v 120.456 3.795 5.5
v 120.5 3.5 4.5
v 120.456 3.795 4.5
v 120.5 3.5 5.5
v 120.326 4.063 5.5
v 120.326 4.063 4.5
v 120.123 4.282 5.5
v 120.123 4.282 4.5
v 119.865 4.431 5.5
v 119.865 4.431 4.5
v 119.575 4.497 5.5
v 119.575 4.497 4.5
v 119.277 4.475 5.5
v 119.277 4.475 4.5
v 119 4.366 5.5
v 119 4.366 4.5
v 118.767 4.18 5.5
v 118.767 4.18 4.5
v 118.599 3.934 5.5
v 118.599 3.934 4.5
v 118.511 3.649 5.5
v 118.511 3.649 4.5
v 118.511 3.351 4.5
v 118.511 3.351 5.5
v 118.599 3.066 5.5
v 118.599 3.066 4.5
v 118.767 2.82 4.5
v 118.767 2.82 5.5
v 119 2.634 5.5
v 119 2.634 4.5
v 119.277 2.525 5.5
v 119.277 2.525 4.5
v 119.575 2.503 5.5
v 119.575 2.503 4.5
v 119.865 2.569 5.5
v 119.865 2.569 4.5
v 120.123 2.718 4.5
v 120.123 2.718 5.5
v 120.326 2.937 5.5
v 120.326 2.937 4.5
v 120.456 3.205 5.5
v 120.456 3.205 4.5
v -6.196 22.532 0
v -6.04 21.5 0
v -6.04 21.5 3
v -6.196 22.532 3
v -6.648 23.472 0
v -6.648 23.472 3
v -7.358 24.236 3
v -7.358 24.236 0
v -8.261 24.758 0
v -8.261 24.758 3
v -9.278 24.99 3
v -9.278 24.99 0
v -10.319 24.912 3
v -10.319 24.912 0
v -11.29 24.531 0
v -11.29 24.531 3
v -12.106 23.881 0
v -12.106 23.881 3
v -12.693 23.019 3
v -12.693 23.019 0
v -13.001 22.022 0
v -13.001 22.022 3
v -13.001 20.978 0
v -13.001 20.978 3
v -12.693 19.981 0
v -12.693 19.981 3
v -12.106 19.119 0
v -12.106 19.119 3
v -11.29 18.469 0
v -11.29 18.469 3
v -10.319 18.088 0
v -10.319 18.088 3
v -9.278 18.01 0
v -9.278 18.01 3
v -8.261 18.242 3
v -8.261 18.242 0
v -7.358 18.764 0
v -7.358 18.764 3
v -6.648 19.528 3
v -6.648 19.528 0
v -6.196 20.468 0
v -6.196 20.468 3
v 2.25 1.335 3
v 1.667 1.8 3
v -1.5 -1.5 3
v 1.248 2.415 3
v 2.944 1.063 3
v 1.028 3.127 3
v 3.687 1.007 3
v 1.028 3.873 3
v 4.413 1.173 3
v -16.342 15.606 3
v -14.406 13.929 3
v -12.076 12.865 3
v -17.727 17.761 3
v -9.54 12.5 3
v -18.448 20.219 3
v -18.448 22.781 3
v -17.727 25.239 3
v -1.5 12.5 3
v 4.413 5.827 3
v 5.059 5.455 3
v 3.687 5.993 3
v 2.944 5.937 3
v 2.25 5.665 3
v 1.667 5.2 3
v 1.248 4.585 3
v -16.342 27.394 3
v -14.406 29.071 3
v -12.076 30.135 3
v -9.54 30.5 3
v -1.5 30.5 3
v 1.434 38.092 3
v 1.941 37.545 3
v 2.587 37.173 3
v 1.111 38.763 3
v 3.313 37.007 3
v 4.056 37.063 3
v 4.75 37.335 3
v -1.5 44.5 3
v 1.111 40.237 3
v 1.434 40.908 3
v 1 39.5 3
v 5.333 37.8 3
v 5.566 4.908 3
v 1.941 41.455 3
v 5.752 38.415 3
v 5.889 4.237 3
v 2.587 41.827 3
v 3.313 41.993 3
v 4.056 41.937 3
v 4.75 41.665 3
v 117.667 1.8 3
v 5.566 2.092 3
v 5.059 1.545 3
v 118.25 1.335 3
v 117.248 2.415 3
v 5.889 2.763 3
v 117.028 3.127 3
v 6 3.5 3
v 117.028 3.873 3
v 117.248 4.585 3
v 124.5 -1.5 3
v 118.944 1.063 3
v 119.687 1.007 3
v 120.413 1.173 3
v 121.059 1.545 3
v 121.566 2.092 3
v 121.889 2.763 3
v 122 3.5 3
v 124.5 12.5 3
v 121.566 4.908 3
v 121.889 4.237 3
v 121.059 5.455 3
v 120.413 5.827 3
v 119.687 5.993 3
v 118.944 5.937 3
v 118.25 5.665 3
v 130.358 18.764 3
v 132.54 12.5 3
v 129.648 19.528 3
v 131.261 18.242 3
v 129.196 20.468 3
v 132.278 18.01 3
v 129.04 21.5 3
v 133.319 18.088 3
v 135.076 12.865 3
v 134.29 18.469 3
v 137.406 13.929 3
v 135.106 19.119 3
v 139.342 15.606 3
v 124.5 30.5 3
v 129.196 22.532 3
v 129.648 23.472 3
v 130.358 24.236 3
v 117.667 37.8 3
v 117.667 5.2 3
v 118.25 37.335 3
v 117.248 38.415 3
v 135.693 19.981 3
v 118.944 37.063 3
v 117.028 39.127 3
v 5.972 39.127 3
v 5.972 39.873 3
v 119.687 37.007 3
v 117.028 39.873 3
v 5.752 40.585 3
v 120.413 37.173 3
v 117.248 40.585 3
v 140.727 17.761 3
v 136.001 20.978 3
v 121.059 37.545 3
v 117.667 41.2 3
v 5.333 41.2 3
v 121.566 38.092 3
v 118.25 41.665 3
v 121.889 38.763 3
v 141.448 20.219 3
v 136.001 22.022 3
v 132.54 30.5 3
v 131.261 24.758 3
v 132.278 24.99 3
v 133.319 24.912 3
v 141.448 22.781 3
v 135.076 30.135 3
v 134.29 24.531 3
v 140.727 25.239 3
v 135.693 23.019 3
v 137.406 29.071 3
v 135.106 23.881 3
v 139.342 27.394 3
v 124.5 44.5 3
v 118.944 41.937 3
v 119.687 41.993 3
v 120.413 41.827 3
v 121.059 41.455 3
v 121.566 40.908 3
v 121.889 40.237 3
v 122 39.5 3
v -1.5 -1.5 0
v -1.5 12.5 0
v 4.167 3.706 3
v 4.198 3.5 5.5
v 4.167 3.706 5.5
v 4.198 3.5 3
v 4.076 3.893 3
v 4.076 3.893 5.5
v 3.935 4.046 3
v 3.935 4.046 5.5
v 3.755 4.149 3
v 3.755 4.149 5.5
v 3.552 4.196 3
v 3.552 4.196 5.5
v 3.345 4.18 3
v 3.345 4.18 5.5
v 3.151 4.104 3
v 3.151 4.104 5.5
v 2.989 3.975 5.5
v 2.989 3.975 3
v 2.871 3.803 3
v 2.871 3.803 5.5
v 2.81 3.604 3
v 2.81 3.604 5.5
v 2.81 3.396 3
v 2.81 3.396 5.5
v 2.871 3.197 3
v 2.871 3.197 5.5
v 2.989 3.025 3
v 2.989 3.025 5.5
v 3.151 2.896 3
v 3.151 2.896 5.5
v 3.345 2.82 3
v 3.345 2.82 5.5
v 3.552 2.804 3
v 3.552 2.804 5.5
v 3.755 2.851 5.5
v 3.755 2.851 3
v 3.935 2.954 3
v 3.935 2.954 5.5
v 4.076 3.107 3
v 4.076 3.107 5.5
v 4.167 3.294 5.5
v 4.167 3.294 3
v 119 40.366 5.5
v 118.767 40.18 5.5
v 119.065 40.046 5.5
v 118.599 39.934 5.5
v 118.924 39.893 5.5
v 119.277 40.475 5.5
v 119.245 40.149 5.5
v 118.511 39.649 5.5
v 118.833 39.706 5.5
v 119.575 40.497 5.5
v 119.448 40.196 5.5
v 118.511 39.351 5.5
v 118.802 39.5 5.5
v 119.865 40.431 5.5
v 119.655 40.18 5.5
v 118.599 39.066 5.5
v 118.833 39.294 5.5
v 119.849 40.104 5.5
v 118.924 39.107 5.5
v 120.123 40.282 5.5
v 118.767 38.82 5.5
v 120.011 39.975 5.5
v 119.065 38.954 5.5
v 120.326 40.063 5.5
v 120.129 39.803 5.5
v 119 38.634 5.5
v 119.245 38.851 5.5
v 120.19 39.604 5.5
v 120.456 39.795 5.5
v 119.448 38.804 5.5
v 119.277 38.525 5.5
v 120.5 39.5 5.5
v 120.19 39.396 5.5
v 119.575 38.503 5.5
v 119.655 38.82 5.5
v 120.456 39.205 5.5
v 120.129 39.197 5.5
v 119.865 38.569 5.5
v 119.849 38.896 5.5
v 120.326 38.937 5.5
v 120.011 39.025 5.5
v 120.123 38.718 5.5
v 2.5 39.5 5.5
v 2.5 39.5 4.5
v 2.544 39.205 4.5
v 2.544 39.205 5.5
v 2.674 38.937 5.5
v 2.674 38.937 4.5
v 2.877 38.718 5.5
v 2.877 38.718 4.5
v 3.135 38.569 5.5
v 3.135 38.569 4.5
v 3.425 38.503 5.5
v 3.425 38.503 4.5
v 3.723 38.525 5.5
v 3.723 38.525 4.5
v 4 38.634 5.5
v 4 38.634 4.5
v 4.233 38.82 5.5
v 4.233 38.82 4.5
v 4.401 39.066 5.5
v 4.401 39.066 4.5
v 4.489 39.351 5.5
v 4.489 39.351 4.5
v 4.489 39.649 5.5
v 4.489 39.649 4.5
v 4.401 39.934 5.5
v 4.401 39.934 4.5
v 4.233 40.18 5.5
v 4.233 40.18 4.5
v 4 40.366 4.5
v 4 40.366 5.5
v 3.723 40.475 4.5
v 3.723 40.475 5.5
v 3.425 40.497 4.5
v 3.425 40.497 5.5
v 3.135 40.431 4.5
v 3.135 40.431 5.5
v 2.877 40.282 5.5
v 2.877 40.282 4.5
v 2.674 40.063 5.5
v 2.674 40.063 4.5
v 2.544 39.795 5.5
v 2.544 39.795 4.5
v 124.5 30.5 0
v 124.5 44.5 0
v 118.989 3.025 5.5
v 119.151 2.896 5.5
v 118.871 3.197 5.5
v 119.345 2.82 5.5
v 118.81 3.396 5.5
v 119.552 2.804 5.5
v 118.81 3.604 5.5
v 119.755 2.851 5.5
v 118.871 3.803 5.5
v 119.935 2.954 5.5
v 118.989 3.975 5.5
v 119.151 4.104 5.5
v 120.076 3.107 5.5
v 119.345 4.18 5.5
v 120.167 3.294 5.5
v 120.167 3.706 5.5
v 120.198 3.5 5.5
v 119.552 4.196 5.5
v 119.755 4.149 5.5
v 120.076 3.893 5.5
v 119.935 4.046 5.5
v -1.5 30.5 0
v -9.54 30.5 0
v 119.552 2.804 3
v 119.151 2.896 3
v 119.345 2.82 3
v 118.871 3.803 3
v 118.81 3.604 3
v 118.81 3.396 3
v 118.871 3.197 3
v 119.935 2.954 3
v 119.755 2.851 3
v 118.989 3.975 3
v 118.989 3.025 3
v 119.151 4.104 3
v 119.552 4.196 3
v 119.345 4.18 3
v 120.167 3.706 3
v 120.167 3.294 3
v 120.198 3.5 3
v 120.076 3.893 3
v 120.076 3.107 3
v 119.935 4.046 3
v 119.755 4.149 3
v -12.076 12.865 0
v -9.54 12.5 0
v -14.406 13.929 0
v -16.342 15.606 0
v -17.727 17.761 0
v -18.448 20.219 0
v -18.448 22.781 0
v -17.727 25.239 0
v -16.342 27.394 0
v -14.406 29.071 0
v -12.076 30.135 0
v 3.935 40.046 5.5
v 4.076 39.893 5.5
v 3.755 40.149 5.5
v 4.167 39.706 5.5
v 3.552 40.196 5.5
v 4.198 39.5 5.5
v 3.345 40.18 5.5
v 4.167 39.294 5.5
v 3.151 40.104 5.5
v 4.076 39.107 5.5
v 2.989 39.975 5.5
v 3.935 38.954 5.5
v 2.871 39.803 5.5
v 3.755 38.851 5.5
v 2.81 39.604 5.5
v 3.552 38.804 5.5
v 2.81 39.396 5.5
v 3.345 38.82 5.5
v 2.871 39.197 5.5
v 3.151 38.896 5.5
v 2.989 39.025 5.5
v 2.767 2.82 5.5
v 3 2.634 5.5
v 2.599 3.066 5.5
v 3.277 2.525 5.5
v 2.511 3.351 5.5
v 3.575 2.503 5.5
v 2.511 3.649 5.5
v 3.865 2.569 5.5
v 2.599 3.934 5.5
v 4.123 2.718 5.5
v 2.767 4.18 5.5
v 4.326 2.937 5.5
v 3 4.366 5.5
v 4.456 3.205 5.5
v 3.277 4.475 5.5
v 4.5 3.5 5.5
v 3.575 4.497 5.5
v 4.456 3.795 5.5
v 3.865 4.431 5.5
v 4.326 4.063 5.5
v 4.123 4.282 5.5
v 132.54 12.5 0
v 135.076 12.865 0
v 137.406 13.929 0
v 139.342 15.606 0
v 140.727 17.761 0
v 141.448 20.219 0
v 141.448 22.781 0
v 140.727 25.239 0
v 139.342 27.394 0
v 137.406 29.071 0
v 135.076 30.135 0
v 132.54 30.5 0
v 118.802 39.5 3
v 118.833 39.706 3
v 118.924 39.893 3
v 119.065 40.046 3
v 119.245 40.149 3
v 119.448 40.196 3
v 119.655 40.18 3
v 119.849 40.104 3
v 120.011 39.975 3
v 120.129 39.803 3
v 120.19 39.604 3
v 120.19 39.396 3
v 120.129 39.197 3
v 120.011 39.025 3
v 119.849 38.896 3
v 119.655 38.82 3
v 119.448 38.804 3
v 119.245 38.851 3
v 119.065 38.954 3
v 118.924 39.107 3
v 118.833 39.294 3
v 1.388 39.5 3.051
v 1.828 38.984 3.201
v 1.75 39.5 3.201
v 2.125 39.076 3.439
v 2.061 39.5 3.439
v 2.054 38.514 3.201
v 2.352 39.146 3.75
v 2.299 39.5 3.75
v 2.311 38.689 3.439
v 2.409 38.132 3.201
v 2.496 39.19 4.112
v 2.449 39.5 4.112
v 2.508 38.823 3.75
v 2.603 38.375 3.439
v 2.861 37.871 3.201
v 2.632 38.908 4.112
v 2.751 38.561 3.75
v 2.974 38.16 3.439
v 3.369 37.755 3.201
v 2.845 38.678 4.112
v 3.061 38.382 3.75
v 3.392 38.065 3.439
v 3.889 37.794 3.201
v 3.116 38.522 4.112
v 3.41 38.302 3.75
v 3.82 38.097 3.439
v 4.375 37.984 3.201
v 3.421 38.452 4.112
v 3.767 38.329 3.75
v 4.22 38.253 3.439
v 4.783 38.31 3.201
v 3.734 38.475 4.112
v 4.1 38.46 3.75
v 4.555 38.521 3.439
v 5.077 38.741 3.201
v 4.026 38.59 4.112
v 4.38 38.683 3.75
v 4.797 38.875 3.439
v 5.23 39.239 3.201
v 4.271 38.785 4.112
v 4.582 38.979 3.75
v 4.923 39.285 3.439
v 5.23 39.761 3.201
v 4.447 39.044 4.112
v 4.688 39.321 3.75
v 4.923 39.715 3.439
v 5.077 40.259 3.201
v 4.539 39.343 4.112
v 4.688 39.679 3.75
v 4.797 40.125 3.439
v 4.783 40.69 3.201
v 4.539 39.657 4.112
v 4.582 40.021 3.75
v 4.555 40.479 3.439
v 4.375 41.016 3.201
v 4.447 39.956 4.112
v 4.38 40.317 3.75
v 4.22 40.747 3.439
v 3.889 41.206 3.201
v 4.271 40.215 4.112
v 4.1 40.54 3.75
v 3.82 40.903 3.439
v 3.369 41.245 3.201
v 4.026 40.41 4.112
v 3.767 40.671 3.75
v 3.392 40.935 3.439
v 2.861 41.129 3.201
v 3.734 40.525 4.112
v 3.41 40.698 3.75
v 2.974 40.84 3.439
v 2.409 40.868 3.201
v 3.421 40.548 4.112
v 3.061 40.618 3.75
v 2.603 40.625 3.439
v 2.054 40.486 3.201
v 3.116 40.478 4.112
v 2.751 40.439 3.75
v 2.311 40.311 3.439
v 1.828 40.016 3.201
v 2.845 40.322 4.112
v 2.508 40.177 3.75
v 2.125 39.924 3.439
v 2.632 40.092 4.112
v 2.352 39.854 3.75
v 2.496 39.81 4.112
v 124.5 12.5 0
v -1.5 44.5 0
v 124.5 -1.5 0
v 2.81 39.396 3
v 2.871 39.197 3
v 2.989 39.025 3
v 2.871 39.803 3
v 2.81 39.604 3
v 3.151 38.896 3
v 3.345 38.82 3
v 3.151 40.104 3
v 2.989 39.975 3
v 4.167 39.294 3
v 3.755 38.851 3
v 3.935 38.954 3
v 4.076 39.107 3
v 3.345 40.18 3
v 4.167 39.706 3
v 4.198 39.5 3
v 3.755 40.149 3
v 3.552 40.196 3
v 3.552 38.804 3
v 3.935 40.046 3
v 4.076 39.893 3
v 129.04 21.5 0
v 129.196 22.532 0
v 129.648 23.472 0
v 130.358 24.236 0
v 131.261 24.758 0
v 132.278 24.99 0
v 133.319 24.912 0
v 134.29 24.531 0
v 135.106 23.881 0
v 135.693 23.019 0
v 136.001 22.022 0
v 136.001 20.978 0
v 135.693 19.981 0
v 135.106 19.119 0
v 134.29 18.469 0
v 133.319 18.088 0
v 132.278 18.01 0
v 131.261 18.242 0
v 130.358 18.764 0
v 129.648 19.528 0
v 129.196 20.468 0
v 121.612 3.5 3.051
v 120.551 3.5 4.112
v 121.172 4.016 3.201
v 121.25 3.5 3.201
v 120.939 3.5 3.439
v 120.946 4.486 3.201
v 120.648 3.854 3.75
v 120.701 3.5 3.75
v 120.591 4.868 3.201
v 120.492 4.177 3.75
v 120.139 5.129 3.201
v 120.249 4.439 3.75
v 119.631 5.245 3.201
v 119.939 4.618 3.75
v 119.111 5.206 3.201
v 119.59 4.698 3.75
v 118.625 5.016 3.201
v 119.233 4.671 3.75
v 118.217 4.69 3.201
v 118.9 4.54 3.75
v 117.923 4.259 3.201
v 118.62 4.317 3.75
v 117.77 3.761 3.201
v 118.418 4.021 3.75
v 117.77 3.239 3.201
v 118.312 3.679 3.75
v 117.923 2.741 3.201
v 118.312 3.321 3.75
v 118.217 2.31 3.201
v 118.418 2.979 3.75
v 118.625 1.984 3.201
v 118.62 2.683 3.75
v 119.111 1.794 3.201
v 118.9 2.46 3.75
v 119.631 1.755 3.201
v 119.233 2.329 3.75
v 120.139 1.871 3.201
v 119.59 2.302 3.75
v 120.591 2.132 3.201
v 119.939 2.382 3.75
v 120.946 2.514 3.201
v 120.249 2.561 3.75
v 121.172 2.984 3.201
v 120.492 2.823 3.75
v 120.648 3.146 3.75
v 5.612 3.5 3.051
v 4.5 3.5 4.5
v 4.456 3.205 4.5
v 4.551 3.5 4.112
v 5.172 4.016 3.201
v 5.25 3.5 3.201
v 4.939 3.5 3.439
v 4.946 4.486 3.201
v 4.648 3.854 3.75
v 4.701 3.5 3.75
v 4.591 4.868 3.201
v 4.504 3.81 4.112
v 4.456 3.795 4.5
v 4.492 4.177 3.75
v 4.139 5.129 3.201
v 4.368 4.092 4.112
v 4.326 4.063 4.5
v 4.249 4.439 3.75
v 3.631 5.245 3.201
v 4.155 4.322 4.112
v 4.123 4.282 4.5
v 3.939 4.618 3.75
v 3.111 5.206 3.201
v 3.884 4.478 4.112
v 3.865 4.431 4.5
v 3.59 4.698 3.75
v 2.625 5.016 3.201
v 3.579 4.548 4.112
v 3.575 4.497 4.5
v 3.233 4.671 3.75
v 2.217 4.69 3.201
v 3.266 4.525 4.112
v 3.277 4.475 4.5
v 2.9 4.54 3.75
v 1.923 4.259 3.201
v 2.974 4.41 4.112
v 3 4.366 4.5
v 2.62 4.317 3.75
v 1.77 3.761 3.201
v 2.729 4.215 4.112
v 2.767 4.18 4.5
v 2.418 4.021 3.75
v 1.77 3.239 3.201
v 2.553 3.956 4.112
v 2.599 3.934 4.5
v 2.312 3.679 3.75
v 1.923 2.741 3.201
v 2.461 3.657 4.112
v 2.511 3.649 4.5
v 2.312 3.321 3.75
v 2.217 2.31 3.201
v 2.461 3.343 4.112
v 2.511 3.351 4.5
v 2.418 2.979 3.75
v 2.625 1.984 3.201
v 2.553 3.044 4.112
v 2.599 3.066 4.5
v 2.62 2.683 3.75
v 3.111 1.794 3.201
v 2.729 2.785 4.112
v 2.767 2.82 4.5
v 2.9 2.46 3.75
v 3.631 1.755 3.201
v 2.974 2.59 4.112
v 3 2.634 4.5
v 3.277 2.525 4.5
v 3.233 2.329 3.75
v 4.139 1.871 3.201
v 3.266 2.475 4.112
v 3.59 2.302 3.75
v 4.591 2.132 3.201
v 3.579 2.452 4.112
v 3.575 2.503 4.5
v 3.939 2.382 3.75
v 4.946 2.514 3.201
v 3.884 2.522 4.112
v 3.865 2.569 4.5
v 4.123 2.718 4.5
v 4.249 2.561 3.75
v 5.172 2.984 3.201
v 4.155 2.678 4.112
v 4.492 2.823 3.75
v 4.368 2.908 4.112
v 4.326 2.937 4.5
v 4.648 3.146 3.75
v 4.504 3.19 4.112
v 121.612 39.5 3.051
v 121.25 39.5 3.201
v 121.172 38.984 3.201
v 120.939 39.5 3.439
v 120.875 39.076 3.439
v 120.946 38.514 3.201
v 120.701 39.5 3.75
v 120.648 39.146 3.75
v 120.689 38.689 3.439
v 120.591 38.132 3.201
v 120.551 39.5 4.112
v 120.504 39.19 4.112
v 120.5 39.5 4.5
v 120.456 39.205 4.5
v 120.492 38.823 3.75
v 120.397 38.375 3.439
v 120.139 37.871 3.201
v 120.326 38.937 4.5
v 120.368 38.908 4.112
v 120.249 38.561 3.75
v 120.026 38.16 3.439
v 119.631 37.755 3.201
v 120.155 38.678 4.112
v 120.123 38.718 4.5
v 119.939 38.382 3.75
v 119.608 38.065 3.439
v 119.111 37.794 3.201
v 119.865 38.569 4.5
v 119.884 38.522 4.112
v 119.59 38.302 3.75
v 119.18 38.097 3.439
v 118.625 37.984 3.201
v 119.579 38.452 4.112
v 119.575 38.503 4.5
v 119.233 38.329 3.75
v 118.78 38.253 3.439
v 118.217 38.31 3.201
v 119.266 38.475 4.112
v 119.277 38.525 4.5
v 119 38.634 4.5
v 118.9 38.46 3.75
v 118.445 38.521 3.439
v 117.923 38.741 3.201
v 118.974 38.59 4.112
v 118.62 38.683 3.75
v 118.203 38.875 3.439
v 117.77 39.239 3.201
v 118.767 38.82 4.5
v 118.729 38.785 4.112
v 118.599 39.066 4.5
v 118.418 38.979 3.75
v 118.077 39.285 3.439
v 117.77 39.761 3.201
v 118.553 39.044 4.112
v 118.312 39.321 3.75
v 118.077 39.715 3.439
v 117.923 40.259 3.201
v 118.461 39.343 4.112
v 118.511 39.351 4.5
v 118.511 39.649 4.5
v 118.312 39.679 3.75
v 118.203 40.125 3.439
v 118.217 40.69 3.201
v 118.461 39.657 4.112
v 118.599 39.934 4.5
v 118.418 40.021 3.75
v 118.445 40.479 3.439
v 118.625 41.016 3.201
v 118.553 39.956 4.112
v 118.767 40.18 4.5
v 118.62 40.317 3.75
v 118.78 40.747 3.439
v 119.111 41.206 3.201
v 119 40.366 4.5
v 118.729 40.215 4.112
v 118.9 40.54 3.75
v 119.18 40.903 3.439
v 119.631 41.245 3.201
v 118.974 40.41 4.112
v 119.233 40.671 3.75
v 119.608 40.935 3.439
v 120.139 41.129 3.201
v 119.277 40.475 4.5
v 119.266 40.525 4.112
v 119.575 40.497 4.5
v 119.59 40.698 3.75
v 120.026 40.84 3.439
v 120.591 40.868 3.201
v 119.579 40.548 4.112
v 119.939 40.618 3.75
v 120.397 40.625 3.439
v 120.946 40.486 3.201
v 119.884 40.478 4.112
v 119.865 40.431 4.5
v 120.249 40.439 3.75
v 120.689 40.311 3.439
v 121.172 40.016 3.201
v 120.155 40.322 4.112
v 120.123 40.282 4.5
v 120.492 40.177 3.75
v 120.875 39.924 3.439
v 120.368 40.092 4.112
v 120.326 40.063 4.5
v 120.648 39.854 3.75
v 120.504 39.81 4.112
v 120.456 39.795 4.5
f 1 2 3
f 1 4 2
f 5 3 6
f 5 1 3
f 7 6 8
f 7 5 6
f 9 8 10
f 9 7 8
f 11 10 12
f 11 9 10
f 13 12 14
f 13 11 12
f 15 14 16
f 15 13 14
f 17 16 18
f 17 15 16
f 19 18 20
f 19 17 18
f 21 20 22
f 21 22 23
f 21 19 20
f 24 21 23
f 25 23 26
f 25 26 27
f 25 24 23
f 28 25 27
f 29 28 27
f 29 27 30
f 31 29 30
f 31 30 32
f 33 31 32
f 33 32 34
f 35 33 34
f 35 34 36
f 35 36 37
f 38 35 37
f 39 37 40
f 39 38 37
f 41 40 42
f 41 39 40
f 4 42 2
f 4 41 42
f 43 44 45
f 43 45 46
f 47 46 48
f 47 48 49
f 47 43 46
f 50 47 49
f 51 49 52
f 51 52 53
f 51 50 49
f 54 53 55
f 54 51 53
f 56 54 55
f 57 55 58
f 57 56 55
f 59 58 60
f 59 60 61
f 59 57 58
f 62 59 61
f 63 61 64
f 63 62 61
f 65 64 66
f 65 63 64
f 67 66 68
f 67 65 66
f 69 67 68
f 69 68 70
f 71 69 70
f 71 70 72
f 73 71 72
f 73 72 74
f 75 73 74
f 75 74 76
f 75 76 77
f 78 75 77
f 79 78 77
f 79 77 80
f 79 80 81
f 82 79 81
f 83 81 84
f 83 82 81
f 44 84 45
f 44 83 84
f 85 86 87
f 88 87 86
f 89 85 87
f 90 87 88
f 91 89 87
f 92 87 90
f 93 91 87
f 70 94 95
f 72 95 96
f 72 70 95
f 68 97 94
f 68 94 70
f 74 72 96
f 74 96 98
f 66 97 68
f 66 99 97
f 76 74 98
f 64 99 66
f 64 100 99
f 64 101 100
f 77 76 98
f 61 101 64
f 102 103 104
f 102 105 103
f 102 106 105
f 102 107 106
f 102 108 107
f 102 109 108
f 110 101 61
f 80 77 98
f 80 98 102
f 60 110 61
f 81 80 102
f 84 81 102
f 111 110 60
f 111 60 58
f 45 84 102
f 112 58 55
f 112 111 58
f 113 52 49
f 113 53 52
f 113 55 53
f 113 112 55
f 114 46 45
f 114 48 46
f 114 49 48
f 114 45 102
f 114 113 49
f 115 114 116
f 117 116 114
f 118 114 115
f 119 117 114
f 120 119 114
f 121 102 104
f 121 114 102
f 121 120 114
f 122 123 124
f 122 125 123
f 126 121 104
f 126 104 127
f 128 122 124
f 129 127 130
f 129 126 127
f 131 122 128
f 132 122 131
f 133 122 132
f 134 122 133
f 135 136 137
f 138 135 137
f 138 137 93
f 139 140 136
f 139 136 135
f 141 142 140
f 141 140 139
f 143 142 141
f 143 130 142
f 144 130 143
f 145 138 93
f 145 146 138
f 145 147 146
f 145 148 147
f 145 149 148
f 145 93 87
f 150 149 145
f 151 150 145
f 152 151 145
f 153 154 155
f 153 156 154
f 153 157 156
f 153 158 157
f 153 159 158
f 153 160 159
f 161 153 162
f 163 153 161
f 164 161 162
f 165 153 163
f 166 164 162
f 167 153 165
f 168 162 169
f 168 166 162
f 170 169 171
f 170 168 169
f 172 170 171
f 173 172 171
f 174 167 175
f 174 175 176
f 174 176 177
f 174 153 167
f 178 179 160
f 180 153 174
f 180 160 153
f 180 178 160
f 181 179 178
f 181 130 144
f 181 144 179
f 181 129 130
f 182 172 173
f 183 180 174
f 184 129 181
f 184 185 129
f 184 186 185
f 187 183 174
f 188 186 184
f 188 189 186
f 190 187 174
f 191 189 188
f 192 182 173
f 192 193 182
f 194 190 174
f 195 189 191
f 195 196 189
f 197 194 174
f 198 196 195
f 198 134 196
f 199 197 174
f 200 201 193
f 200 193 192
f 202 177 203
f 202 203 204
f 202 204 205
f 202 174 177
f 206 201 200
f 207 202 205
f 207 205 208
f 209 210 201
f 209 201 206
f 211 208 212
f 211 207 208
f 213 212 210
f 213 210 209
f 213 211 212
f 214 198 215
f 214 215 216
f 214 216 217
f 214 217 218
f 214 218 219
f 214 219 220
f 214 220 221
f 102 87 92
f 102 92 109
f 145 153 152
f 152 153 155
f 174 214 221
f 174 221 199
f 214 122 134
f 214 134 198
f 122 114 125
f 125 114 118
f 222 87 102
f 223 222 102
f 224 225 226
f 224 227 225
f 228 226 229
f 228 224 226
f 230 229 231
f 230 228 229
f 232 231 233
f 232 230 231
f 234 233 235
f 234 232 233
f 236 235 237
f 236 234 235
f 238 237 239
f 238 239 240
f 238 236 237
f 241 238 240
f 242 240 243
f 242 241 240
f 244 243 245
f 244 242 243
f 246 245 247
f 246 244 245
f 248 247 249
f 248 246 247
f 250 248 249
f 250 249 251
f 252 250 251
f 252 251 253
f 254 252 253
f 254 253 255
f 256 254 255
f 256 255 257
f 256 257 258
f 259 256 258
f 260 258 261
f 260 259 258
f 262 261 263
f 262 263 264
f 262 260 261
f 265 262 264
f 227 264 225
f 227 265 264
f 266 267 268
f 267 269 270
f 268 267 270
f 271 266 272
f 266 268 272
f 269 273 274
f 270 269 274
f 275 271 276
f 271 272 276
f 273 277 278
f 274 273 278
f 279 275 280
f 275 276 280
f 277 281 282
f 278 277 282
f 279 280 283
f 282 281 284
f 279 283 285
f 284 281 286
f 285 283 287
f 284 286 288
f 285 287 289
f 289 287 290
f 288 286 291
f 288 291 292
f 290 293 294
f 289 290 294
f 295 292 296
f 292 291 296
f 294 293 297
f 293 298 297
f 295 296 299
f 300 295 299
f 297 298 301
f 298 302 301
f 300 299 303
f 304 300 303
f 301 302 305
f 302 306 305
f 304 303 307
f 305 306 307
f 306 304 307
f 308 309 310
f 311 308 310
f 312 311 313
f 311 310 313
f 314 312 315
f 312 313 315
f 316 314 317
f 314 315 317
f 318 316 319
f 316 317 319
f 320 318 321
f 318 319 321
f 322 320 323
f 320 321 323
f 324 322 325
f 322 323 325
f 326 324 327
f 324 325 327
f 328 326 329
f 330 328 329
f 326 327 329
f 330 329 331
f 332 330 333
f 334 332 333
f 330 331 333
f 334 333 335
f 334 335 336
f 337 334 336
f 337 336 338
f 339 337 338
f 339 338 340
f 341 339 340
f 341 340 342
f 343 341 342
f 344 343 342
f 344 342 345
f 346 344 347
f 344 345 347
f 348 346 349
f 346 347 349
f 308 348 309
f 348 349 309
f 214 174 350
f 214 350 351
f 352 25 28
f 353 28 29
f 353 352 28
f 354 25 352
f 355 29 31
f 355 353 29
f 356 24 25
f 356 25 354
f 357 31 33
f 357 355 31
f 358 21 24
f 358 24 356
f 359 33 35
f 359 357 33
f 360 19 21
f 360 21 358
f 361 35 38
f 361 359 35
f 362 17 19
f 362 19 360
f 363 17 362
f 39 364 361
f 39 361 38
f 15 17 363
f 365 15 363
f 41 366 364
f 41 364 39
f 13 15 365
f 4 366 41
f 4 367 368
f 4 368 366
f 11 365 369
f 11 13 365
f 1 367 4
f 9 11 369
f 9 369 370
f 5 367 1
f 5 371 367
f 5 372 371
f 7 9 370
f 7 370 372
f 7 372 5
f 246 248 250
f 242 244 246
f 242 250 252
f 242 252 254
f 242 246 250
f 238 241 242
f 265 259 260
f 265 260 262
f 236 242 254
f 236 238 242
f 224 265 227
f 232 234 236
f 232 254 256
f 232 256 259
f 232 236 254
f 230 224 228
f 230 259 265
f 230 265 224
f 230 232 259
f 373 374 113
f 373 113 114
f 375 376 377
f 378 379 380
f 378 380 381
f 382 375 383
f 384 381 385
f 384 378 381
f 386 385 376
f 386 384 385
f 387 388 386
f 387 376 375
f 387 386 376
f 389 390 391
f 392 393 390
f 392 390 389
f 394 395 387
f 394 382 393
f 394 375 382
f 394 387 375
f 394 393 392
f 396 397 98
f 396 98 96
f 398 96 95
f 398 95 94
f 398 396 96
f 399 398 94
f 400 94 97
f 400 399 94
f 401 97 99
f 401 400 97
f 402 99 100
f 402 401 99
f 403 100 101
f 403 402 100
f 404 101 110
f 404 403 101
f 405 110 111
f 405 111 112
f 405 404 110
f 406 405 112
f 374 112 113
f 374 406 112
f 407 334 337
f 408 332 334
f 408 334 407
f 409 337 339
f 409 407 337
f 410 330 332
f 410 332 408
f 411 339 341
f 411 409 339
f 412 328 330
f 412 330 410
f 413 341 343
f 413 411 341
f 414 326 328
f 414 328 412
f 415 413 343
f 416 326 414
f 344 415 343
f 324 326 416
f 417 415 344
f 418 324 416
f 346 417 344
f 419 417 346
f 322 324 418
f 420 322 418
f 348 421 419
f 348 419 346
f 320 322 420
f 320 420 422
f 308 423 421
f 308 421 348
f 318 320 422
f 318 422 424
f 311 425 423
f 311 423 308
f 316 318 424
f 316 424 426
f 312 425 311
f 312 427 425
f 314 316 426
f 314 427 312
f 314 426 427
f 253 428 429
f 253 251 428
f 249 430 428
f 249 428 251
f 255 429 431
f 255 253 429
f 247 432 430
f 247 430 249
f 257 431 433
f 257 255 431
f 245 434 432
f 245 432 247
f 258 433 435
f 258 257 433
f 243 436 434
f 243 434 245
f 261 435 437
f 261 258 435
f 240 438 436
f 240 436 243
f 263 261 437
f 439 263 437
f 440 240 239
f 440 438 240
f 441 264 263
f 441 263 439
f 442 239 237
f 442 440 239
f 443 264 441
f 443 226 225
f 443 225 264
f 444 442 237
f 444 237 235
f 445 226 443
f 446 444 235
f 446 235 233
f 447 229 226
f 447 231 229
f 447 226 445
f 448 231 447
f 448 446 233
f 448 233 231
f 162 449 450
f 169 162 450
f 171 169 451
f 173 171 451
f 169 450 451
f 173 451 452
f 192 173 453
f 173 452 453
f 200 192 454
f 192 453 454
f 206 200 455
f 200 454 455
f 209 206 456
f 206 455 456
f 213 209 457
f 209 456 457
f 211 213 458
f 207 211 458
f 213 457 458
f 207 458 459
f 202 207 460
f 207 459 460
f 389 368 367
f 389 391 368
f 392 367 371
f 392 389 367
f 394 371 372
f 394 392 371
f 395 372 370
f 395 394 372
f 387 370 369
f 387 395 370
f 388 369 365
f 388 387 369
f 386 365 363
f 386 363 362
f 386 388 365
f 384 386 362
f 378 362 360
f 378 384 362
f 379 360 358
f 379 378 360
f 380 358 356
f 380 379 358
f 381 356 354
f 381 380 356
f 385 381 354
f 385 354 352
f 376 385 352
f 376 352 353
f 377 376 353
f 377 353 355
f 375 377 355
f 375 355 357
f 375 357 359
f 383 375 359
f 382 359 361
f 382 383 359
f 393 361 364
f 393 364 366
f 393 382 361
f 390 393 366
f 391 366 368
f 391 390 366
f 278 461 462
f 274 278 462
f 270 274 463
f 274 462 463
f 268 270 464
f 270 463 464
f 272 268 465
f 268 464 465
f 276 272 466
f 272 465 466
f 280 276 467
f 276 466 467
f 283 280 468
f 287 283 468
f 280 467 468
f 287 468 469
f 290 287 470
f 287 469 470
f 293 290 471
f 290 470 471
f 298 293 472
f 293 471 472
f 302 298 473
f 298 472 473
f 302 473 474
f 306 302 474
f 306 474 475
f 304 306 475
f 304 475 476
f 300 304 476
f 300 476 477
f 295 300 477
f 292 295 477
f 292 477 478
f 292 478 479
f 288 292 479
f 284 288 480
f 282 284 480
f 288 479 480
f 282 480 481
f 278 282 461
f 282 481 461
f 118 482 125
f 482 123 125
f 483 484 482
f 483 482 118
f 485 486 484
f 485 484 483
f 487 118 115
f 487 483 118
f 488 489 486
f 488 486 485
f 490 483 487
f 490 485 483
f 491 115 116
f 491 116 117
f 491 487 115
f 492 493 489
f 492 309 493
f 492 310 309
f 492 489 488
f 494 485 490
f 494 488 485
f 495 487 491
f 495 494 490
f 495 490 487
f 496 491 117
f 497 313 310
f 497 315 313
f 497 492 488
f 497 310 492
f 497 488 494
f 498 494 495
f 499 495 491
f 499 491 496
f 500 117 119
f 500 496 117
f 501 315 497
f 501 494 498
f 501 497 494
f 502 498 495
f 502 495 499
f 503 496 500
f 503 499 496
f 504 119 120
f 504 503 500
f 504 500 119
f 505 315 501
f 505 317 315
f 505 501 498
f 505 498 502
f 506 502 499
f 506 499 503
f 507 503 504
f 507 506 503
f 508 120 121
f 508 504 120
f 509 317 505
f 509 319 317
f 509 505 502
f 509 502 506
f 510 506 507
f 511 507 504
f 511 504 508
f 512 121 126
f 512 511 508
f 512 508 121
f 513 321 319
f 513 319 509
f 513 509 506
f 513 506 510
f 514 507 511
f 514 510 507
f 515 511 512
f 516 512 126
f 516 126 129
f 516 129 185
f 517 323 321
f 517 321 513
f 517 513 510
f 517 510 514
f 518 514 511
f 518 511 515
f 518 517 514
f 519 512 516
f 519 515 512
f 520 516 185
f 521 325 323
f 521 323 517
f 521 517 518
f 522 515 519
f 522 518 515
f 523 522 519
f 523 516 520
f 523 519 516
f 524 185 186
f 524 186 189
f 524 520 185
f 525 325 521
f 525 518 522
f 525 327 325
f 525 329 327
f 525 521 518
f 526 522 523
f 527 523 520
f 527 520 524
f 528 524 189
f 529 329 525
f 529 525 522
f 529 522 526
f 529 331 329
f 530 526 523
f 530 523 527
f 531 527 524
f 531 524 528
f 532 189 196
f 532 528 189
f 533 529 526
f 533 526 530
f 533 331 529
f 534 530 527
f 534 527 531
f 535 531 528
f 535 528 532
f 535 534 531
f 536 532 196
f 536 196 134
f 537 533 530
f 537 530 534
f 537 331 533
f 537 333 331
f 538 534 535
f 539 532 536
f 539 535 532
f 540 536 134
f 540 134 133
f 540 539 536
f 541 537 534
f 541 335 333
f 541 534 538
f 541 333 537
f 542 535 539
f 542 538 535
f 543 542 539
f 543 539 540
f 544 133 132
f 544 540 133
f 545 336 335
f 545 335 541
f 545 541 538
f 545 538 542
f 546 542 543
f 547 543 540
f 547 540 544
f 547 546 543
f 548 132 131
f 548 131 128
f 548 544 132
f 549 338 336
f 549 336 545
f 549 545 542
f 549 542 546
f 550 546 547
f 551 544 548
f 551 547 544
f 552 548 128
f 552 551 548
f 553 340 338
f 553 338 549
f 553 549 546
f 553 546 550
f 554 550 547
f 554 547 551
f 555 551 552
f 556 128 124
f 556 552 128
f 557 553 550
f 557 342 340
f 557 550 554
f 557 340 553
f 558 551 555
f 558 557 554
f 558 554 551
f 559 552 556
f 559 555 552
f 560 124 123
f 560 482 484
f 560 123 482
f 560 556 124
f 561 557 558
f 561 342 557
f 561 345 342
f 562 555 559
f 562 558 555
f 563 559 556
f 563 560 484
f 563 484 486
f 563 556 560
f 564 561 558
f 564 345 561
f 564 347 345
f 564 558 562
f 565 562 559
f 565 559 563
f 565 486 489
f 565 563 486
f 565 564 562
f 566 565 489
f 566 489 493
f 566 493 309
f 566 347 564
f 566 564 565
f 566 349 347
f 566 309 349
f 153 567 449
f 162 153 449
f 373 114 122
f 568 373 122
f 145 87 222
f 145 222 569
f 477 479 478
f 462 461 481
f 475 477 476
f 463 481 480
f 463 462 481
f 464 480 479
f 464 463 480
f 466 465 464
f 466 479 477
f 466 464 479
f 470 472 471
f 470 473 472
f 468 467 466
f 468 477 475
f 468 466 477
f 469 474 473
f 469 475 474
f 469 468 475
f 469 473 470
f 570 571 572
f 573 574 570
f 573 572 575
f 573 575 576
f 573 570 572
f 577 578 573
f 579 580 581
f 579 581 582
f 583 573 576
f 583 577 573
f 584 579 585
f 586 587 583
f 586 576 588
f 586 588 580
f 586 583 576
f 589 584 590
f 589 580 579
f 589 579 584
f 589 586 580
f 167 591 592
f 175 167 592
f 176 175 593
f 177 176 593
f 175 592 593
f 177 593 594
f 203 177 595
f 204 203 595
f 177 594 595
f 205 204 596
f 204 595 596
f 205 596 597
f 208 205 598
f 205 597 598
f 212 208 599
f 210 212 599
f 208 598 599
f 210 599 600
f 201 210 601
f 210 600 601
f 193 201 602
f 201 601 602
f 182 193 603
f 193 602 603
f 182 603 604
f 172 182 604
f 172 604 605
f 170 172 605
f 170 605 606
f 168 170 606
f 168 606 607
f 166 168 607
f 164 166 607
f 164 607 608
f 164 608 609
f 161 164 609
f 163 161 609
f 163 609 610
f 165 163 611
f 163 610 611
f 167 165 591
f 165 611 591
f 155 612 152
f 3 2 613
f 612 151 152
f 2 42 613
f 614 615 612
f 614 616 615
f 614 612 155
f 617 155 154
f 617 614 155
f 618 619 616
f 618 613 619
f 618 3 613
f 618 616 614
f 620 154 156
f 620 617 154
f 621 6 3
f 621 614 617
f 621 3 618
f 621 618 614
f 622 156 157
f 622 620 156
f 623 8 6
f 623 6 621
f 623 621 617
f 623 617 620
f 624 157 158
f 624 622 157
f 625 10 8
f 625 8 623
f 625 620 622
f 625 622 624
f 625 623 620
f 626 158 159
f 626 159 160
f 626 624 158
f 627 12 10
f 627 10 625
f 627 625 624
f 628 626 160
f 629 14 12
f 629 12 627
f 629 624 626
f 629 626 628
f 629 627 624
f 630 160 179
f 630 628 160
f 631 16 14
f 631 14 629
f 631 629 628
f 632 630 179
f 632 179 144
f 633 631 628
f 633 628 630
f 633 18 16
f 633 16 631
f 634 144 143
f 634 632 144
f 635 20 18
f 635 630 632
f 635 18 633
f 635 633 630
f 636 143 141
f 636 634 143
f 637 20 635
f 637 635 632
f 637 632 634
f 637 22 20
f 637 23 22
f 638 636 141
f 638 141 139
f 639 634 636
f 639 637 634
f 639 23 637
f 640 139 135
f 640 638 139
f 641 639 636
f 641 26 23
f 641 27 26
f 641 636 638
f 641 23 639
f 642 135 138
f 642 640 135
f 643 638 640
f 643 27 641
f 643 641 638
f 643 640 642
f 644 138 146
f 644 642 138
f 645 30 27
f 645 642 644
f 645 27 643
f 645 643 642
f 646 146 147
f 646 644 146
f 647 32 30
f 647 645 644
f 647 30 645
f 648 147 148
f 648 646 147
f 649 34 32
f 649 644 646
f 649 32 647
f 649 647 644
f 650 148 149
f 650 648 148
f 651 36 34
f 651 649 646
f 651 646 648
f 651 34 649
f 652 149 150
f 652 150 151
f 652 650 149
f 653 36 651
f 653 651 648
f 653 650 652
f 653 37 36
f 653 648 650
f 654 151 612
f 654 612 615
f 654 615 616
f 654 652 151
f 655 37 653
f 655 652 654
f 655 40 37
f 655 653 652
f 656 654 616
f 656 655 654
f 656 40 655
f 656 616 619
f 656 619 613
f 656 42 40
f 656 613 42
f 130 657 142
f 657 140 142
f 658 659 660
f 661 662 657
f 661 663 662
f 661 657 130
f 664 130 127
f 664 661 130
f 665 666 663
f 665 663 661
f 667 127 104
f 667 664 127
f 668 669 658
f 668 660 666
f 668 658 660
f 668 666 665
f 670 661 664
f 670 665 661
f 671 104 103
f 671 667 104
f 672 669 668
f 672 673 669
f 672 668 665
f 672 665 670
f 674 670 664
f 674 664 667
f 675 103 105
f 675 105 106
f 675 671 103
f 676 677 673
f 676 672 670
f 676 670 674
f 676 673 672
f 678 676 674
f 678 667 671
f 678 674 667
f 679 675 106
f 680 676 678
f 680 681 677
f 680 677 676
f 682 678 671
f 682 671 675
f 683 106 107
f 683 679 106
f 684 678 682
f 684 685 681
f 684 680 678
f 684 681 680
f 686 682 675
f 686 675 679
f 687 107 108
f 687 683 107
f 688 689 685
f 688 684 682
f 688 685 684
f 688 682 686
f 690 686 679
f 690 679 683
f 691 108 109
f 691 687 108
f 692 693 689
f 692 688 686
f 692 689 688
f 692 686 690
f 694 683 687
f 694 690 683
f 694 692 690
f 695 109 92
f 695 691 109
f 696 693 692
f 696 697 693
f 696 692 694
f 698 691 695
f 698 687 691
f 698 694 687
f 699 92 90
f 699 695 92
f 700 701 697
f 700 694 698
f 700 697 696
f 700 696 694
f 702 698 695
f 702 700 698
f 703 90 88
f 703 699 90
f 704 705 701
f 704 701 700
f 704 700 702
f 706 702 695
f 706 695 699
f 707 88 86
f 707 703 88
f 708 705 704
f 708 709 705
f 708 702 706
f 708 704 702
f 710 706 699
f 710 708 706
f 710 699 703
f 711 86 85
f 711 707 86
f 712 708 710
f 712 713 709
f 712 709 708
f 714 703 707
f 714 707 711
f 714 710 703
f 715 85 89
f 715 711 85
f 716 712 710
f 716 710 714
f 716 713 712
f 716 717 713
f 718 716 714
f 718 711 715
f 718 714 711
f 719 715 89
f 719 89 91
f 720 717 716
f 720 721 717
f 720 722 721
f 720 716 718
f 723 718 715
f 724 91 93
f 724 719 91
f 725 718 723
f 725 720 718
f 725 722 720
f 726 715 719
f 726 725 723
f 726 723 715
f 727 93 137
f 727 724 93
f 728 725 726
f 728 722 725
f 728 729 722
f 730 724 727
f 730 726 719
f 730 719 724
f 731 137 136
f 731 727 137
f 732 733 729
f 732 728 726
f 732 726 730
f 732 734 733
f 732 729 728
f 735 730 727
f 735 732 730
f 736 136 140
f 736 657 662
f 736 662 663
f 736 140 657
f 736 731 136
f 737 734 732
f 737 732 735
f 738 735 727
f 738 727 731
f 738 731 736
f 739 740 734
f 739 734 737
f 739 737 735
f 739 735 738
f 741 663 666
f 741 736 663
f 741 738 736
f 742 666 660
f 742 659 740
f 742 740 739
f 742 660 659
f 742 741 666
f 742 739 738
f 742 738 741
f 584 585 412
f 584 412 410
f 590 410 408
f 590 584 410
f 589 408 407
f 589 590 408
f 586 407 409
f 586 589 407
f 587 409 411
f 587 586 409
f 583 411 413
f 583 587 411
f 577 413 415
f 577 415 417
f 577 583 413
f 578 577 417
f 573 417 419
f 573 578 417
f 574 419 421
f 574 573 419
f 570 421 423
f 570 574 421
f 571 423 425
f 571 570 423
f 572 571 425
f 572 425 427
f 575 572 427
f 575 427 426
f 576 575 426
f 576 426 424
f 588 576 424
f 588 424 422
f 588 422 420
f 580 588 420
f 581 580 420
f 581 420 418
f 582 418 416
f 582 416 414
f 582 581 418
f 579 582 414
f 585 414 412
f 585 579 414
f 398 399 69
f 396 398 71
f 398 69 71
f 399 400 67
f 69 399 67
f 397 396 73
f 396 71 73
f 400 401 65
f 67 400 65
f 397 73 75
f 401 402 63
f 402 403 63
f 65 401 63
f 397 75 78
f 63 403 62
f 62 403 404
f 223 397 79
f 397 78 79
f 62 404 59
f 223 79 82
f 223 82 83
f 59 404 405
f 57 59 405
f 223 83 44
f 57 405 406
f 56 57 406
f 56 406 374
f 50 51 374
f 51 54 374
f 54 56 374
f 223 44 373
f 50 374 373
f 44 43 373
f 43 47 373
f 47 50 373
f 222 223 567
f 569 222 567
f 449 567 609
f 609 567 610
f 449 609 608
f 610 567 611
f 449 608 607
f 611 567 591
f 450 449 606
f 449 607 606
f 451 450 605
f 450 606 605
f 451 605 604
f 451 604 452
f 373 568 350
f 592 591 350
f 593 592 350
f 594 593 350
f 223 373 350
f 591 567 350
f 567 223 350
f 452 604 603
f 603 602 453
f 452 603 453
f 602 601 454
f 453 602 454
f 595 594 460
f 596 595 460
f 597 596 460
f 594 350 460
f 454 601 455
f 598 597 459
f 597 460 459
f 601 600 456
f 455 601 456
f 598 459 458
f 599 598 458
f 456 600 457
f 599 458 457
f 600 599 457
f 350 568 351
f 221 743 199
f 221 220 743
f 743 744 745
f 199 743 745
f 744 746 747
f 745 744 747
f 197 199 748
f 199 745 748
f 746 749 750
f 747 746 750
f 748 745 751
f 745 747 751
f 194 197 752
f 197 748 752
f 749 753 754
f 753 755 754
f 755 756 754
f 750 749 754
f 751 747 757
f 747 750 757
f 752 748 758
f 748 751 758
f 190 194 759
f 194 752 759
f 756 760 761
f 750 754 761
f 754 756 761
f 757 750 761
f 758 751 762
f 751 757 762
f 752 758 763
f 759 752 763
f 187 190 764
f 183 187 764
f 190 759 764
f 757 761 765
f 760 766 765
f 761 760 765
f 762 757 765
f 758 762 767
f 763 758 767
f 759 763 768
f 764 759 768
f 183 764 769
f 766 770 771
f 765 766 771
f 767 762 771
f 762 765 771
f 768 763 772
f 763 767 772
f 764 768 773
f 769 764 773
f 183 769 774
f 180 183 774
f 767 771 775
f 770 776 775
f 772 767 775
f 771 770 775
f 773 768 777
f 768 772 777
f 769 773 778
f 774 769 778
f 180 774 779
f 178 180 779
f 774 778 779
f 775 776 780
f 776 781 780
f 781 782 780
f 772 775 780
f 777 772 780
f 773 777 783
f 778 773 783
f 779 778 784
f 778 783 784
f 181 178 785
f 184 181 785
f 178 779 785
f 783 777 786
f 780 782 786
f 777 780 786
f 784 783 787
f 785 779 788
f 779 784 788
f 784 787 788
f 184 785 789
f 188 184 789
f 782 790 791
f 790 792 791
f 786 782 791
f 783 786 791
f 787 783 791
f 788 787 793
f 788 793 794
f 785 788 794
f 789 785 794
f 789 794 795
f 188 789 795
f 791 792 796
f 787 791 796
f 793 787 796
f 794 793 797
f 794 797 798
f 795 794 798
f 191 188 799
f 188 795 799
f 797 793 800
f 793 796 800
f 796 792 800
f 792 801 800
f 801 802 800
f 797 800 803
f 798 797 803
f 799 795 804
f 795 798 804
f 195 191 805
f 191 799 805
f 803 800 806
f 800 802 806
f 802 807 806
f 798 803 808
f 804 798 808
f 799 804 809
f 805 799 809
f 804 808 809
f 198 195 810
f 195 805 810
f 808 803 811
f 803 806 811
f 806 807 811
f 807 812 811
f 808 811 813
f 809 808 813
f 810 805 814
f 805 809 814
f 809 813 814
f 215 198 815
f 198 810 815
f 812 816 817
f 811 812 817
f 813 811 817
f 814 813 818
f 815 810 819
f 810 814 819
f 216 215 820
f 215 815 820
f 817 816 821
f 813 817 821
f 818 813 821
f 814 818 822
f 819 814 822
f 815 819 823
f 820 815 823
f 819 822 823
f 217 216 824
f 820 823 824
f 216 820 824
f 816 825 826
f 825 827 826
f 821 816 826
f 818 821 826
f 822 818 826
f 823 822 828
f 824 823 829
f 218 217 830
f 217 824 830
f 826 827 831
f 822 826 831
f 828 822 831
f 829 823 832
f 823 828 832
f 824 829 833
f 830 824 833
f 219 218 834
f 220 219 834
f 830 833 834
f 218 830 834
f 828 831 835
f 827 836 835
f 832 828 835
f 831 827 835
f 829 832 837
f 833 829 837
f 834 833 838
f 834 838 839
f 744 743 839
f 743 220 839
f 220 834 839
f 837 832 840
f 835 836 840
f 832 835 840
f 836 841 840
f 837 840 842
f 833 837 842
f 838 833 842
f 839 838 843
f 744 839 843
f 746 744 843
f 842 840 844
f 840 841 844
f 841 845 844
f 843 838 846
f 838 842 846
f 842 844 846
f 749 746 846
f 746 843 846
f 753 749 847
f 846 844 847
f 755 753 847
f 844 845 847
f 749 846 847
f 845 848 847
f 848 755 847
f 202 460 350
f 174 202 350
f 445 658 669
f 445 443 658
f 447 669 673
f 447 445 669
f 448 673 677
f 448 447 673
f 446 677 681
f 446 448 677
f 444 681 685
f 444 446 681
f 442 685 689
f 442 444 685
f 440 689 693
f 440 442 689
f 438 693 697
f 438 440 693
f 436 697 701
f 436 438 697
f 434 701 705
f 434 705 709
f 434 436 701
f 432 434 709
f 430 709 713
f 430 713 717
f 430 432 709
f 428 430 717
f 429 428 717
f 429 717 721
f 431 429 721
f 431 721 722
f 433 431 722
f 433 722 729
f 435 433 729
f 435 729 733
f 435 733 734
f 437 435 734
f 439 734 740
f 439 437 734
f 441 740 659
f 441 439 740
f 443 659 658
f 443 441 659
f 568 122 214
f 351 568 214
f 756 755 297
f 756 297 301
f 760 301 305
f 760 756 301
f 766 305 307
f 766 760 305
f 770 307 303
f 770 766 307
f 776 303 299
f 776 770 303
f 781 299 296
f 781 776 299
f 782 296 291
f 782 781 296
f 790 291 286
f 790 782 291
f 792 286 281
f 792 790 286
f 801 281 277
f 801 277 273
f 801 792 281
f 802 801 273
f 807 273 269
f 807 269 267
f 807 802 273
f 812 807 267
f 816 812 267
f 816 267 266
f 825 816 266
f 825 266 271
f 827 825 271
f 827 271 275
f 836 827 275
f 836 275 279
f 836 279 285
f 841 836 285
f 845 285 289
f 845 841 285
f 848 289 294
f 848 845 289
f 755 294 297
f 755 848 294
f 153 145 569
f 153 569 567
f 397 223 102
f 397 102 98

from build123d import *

# Parameters (mm, degrees)
SKETCH_1_W             = 123
SKETCH_1_H             = 43
EXTRUDE_1_DEPTH        = 3
SKETCH_2_W             = 126
SKETCH_2_H             = 46
SKETCH_2_W_2           = 123
SKETCH_2_H_2           = 43
EXTRUDE_2_DEPTH        = 3
SKETCH_5_R             = 1
SKETCH_5_R_2           = 0.697721568
EXTRUDE_5_DEPTH        = 2.5
FILLET_6_R             = 1.5
FILLET_6_OF_MIRROR_1_R = 1.5
SKETCH_8_R             = 3.5
EXTRUDE_8_DEPTH        = 3


# Read off the part's stored shape, not the designer's step: Зеркальное отражение2
with BuildPart() as part:
    # Эскиз1 → Бобышка-Вытянуть1 (new body)
    with BuildSketch(Plane.XY):
        with Locations((61.5, 21.5)):
            Rectangle(SKETCH_1_W, SKETCH_1_H)
    extrude(amount=EXTRUDE_1_DEPTH)

    # Эскиз2 → Бобышка-Вытянуть2 (add)
    with BuildSketch(Plane.XY.offset(3)):
        with Locations((61.5, 21.5)):
            Rectangle(SKETCH_2_W, SKETCH_2_H)
        with Locations((61.5, 21.5)):
            Rectangle(SKETCH_2_W_2, SKETCH_2_H_2, mode=Mode.SUBTRACT)
    extrude(amount=-EXTRUDE_2_DEPTH)

    # Эскиз5 → Бобышка-Вытянуть5 (add)
    with BuildSketch(Plane.XY.offset(3)):
        with Locations(Location((3.5, 39.5, 0), (0, 0, 180))):
            Circle(SKETCH_5_R)
        with Locations((3.5, 39.5)):
            Circle(SKETCH_5_R_2, mode=Mode.SUBTRACT)
    extrude_5 = extrude(amount=EXTRUDE_5_DEPTH)

    # Скругление6
    fillet_6_edges = [part.edges().sort_by_distance(p)[0] for p in [
        (4.5, 39.5, 3),
    ]]
    fillet(fillet_6_edges, radius=FILLET_6_R)

    # Зеркальное отражение1: Бобышка-Вытянуть5 across plane
    add(extrude_5.mirror(Plane.ZY.offset(-61.5)))

    # Скругление6 of Зеркальное отражение1
    fillet_6_of_mirror_1_edges = [part.edges().sort_by_distance(p)[0] for p in [
        (118.5, 39.5, 3),
    ]]
    fillet(fillet_6_of_mirror_1_edges, radius=FILLET_6_OF_MIRROR_1_R)

    # Зеркальное отражение2 outline → Зеркальное отражение2 (revolve)
    with BuildSketch(Plane(origin=(3.5, 3.5, 0), x_dir=(1, 0, 0), z_dir=(0, -1, 0))):
        with BuildLine():
            Line((1, 5.5), (0.697721568, 5.5))
            Line((0.697721568, 5.5), (0.697721568, 3))
            Line((0.697721568, 3), (2.5, 3))
            ThreePointArc((2.5, 3), (1.439339828, 3.439339828), (1, 4.5))
            Line((1, 4.5), (1, 5.5))
        make_face()
    revolve(axis=Axis((3.5, 3.5, 0), (0, 0, 1)))

    # Mirror 2 2 outline → Mirror 2 2 (revolve)
    with BuildSketch(Plane(origin=(119.5, 3.5, 0), x_dir=(1, 0, 0), z_dir=(0, -1, 0))):
        with BuildLine():
            Line((1, 5.5), (0.697721568, 5.5))
            Line((0.697721568, 5.5), (0.697721568, 3))
            Line((0.697721568, 3), (2.5, 3))
            ThreePointArc((2.5, 3), (1.439339828, 3.439339828), (1, 4.5))
            Line((1, 4.5), (1, 5.5))
        make_face()
    revolve(axis=Axis((119.5, 3.5, 0), (0, 0, 1)))

    # Эскиз8 → Бобышка-Вытянуть8 (add)
    with BuildSketch(Plane(origin=(0, 0, 0), x_dir=(-1, 0, 0), z_dir=(0, 0, -1))):
        with BuildLine():
            Line((-124.5, 12.5), (-132.54002612, 12.5))
            ThreePointArc((-132.54002612, 12.5), (-141.54002612, 21.5), (-132.54002612, 30.5))
            Line((-132.54002612, 30.5), (-124.5, 30.5))
            Line((-124.5, 30.5), (-124.5, 12.5))
        make_face()
        with Locations((-132.54002612, 21.5)):
            Circle(SKETCH_8_R, mode=Mode.SUBTRACT)
    extrude_8 = extrude(amount=-EXTRUDE_8_DEPTH)

    # Зеркальное отражение8: Бобышка-Вытянуть8 across plane
    add(extrude_8.mirror(Plane.ZY.offset(-61.5)))


solid = part.part
